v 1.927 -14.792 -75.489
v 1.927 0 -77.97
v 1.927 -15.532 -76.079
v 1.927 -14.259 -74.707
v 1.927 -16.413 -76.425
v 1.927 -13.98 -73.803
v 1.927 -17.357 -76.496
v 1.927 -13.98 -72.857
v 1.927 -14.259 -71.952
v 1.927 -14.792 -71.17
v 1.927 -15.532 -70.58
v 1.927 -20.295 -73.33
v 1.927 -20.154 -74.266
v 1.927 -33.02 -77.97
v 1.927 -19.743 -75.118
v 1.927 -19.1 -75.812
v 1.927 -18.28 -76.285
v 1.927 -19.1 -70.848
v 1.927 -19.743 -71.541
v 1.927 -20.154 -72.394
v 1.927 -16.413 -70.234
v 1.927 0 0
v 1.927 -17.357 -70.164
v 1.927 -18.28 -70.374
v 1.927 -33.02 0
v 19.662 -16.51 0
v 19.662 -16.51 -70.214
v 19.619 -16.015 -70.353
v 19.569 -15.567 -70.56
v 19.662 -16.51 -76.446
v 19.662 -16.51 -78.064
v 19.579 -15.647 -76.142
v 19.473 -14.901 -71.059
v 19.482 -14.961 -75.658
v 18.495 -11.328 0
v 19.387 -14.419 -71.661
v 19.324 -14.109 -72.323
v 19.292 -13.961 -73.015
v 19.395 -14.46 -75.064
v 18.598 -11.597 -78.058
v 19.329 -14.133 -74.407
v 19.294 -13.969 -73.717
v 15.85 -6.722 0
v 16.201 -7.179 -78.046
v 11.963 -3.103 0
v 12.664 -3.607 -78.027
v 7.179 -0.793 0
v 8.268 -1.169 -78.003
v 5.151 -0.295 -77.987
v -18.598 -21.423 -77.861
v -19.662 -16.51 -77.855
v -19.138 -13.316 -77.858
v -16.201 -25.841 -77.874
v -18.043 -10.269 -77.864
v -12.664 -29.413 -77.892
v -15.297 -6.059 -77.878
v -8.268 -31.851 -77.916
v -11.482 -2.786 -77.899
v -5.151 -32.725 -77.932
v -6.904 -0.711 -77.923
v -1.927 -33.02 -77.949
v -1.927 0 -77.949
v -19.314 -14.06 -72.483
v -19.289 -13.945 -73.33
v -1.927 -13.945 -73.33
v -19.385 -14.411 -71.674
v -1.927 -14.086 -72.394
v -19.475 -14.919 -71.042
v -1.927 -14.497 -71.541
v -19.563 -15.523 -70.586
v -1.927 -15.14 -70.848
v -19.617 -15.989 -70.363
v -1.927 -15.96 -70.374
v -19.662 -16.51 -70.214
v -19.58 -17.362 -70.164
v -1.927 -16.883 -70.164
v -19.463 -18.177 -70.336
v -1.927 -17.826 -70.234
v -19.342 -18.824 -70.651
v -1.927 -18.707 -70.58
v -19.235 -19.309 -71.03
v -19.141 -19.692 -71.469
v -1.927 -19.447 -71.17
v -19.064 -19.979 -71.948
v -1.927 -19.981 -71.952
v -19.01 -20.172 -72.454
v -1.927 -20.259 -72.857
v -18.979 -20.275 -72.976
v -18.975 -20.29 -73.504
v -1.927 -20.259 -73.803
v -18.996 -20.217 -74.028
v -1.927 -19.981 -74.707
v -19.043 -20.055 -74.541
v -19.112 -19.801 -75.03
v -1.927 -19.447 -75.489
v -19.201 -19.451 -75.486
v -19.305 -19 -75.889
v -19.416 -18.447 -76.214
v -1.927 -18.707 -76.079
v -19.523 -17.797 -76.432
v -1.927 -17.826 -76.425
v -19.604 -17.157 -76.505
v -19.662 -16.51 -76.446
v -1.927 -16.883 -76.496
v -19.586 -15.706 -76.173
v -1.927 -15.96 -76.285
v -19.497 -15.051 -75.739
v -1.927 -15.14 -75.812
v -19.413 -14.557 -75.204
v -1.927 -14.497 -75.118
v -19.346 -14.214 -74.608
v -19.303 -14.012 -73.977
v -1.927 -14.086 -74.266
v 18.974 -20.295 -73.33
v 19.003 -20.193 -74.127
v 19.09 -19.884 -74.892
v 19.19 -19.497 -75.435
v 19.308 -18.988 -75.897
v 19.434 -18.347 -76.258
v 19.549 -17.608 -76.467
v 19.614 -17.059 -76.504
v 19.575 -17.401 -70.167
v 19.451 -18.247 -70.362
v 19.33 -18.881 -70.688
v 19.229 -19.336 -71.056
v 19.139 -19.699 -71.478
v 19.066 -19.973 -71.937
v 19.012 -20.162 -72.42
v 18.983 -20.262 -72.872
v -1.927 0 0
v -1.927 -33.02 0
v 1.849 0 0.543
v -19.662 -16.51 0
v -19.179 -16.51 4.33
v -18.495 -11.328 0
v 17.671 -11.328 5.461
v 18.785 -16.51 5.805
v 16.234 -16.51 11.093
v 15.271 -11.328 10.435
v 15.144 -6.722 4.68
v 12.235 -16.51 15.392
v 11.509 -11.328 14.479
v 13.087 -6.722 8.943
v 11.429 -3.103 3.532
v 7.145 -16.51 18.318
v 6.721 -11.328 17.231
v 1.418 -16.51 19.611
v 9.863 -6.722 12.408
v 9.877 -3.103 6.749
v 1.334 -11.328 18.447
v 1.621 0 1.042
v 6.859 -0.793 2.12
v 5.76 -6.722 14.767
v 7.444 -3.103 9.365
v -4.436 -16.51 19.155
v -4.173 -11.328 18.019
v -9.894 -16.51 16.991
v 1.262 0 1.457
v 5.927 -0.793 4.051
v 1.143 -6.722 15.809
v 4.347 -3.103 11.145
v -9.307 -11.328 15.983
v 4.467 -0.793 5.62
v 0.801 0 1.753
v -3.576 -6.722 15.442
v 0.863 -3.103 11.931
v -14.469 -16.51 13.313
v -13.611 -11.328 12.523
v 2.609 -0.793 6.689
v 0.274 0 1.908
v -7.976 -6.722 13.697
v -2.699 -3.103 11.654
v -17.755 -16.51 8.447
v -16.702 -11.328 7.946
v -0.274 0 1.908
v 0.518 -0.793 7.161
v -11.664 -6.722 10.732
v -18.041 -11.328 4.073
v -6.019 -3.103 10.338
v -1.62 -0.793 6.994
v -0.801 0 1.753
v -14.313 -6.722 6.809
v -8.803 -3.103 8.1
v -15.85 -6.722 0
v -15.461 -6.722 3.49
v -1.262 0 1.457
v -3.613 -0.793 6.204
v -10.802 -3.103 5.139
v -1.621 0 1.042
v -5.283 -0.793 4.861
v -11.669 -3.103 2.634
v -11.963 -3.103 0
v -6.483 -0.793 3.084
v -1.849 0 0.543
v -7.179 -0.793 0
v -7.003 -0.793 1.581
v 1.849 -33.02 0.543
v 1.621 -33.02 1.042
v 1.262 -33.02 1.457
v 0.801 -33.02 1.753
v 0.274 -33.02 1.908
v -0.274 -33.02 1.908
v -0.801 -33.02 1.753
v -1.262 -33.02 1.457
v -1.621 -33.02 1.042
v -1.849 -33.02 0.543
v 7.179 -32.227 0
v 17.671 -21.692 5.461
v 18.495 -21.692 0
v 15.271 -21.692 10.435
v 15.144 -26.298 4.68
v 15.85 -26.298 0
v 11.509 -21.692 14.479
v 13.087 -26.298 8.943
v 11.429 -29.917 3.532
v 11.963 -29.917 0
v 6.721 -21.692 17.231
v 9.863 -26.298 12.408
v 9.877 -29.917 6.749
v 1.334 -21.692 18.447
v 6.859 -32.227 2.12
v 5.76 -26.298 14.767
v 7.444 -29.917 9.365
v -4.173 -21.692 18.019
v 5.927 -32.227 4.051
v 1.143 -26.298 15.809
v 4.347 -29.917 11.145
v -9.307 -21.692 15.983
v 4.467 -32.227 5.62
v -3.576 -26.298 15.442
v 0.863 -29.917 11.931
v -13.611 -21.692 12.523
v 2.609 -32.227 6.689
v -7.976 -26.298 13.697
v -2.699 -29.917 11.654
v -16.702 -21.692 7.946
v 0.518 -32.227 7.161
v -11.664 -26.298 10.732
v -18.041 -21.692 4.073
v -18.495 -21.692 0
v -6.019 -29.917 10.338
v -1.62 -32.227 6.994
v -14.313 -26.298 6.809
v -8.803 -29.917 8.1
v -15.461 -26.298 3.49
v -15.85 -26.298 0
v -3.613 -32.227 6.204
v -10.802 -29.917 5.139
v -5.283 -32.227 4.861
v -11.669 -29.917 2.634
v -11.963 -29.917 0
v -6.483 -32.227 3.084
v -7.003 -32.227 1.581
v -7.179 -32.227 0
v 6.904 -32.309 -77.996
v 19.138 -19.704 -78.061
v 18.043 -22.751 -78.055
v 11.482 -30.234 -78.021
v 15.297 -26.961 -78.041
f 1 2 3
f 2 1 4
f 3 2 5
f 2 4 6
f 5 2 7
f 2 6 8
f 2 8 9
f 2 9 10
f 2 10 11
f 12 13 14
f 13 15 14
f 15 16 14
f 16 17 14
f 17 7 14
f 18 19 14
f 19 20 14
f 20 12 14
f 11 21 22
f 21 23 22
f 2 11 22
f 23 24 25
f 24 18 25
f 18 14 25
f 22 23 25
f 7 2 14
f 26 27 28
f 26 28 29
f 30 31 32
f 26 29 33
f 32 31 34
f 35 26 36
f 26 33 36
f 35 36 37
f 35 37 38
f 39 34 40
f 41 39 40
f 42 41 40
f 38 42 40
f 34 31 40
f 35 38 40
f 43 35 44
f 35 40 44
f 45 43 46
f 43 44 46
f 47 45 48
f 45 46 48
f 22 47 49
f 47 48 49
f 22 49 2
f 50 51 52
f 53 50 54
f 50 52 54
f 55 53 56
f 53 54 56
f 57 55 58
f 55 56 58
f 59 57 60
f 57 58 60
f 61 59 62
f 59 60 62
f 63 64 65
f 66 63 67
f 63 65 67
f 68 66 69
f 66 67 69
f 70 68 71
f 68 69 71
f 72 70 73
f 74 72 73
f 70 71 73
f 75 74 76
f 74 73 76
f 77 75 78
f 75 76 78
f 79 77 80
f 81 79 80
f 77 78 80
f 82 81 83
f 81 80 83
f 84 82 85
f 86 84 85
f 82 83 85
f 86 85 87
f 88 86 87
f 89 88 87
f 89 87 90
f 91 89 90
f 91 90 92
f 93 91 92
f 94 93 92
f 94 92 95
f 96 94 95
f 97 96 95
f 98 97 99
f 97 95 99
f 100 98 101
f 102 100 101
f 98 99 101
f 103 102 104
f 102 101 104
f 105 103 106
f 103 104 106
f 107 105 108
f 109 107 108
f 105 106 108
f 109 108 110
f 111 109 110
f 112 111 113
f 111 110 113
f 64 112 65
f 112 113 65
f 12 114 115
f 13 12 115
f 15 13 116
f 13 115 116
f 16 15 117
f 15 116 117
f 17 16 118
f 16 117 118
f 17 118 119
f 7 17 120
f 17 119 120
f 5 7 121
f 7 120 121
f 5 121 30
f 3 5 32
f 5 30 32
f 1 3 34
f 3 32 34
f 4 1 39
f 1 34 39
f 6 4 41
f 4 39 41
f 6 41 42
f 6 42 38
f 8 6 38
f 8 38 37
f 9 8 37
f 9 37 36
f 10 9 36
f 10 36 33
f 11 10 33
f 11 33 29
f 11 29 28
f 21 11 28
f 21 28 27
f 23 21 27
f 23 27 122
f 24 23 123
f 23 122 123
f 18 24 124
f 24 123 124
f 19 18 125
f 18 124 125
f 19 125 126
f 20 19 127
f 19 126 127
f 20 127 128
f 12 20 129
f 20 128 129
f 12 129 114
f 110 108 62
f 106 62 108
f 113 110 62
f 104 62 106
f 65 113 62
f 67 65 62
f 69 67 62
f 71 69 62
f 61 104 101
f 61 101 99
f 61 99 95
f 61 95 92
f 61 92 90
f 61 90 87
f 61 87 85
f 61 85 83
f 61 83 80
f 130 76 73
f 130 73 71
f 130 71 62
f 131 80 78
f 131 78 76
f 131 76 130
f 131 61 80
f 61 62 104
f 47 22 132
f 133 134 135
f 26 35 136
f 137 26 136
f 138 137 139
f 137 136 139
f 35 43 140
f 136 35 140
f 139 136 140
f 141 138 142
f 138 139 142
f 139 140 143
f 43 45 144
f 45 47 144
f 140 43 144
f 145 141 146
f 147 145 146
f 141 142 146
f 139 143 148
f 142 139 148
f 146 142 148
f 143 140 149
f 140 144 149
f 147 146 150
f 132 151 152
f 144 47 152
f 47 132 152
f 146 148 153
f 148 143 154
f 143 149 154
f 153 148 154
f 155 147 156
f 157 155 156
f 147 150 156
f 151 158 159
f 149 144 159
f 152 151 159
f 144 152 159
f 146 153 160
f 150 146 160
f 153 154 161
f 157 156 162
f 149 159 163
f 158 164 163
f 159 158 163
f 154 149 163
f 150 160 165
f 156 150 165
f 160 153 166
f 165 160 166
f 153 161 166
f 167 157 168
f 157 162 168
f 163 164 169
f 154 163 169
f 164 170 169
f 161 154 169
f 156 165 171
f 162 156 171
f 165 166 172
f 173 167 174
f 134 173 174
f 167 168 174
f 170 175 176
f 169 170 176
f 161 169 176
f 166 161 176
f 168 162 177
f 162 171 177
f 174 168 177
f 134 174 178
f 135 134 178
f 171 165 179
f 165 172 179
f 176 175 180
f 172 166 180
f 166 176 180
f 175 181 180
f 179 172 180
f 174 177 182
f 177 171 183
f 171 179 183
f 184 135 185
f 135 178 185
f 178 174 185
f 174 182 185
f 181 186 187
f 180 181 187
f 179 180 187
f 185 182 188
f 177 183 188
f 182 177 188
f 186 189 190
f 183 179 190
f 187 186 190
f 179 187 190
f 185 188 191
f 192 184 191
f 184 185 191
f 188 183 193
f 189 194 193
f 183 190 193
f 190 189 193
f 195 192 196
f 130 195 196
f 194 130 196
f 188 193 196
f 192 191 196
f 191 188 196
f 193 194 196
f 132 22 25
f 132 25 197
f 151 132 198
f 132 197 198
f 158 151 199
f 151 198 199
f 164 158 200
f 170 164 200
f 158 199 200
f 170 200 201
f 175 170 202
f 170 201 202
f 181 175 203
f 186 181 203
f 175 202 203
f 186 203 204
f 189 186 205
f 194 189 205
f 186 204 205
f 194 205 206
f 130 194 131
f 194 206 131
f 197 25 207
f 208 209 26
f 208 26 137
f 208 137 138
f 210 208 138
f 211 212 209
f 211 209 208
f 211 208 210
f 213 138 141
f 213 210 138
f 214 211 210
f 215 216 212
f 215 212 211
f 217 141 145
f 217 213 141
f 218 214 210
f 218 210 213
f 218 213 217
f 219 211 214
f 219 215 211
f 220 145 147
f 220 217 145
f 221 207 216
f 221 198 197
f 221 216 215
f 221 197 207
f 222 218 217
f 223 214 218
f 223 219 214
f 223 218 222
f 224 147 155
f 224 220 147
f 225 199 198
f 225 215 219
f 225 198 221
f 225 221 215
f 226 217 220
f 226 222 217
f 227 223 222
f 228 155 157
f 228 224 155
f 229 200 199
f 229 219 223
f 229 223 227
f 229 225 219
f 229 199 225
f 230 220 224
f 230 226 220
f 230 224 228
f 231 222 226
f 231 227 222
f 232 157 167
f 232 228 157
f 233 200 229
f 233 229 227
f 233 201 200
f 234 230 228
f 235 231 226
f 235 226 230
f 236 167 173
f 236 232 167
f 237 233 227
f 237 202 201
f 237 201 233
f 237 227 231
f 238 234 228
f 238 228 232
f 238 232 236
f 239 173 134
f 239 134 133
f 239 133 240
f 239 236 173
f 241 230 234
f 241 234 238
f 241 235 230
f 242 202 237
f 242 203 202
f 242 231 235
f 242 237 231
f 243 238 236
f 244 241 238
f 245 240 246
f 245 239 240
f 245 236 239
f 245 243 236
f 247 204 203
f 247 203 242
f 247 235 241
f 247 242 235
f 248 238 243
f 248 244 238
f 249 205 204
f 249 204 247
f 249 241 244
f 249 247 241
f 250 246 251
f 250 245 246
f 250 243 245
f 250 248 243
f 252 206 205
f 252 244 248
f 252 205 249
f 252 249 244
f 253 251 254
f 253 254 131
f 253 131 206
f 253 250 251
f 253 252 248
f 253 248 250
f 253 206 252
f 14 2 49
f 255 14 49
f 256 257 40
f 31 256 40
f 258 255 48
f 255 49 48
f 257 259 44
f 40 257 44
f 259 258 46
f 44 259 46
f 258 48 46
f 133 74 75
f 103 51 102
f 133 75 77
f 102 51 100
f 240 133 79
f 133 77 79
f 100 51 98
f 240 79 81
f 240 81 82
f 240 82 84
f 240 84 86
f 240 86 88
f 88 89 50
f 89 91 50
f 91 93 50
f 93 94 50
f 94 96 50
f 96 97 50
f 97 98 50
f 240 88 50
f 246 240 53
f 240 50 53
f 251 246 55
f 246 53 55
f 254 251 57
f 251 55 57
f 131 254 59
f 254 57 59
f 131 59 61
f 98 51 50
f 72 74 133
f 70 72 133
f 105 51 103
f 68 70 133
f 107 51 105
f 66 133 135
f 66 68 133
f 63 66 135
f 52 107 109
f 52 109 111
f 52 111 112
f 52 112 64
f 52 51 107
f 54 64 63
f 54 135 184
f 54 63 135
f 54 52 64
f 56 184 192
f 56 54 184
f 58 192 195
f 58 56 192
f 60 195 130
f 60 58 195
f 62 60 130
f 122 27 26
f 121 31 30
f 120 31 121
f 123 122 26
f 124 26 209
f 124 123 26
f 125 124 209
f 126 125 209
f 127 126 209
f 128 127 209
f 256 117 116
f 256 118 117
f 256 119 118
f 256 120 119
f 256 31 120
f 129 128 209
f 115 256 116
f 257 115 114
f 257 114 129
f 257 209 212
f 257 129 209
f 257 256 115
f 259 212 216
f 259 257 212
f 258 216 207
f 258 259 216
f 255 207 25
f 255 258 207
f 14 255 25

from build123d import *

# Parameters (mm, degrees)
F1_DEPTH    = 33.02
F2_T1_DEPTH = 122.514239143
F2_T3_DEPTH = 122.3049164534
F2_T6_ANGLE = 180
F2_T8_ANGLE = 180
F3_DEPTH    = 127
F5_D        = 6.35
F5_DEPTH    = 19.6628549222
F6_D        = 6.35


# Not quite as in the source:
# - a fillet or chamfer that OpenCascade refuses, or shapes differently, is made with other operations: its cross-section is extruded or revolved along the edge and cut away or added


with BuildPart() as f1:
    # F0 (on Front) → F1 (new body)
    with BuildSketch(Plane.XZ):
        with BuildLine():
            Line((-19.7072699666, 0), (19.7072699666, 0))
            ThreePointArc((19.7072699666, 0), (0, 19.7072699666), (-19.7072699666, 0))
        make_face()
        Polygon((19.7072699666, -78.064239143), (19.7072699666, 0), (-19.7072699666, 0), (-19.7072699666, -77.8549164534), align=None)
    extrude(amount=F1_DEPTH)

    # F2: fillet of radius 17.78 on 2 edges, made by hand

    # F2_s2 → F2_t1 (cut)
    with BuildSketch(Plane.XY.offset(-122.514239143)):
        with BuildLine():
            ThreePointArc((19.7072699666, -17.78), (14.4996285361, -5.2076414305), (1.9272699666, 0))
            Line((1.9272699666, 0), (19.7072699666, 0))
            Line((19.7072699666, 0), (19.7072699666, -17.78))
        make_face()
        with BuildLine():
            ThreePointArc((19.7072699666, -15.24), (14.4996285361, -27.8123585695), (1.9272699666, -33.02))
            Line((1.9272699666, -33.02), (19.7072699666, -33.02))
            Line((19.7072699666, -33.02), (19.7072699666, -15.24))
        make_face()
    extrude(amount=F2_T1_DEPTH, mode=Mode.SUBTRACT)

    # F2_s4 → F2_t3 (cut)
    with BuildSketch(Plane.XY.offset(-122.3049164534)):
        with BuildLine():
            ThreePointArc((-19.7072699666, -15.24), (-14.4996285361, -27.8123585695), (-1.9272699666, -33.02))
            Line((-1.9272699666, -33.02), (-19.7072699666, -33.02))
            Line((-19.7072699666, -33.02), (-19.7072699666, -15.24))
        make_face()
        with BuildLine():
            ThreePointArc((-19.7072699666, -17.78), (-14.4996285361, -5.2076414305), (-1.9272699666, 0))
            Line((-1.9272699666, 0), (-19.7072699666, 0))
            Line((-19.7072699666, 0), (-19.7072699666, -17.78))
        make_face()
    extrude(amount=F2_T3_DEPTH, mode=Mode.SUBTRACT)

    # F2_s5 → F2_t6 (revolve, cut)
    with BuildSketch(Plane.XY):
        with BuildLine():
            ThreePointArc((19.7072699666, -15.24), (14.4996285361, -27.8123585695), (1.9272699666, -33.02))
            Line((1.9272699666, -33.02), (19.7072699666, -33.02))
            Line((19.7072699666, -33.02), (19.7072699666, -15.24))
        make_face()
    revolve(axis=Axis((0, -33.02, 0), (0, -1, 0)), revolution_arc=F2_T6_ANGLE, mode=Mode.SUBTRACT)

    # F2_s7 → F2_t8 (revolve, cut)
    with BuildSketch(Plane.XY):
        with BuildLine():
            ThreePointArc((19.7072699666, -17.78), (14.4996285361, -5.2076414305), (1.9272699666, 0))
            Line((1.9272699666, 0), (19.7072699666, 0))
            Line((19.7072699666, 0), (19.7072699666, -17.78))
        make_face()
    revolve(axis=Axis((0, 0, 0), (0, -1, 0)), revolution_arc=F2_T8_ANGLE, mode=Mode.SUBTRACT)

    # F3 (cut): a face of the model
    f3_faces = [f1.faces().sort_by_distance(p)[0] for p in [
        (8.27376e-05, -33.02, -38.2217878295),
    ]]
    extrude(f3_faces, amount=-F3_DEPTH, mode=Mode.SUBTRACT)

    # F5 (through all, one way)
    with BuildSketch(Plane.YZ):
        with Locations((-17.1199291945, -73.3298659325)):
            Circle(F5_D / 2)
    extrude(amount=-F5_DEPTH, mode=Mode.SUBTRACT)

    # F6 (through all)
    with Locations(Plane(origin=(0, 0, 0), x_dir=(0, 1, 0), z_dir=(-1, 0, 0))):
        with Locations((-17.1199291945, 73.3298659325)):
            Hole(F6_D / 2)


solid = f1.part
